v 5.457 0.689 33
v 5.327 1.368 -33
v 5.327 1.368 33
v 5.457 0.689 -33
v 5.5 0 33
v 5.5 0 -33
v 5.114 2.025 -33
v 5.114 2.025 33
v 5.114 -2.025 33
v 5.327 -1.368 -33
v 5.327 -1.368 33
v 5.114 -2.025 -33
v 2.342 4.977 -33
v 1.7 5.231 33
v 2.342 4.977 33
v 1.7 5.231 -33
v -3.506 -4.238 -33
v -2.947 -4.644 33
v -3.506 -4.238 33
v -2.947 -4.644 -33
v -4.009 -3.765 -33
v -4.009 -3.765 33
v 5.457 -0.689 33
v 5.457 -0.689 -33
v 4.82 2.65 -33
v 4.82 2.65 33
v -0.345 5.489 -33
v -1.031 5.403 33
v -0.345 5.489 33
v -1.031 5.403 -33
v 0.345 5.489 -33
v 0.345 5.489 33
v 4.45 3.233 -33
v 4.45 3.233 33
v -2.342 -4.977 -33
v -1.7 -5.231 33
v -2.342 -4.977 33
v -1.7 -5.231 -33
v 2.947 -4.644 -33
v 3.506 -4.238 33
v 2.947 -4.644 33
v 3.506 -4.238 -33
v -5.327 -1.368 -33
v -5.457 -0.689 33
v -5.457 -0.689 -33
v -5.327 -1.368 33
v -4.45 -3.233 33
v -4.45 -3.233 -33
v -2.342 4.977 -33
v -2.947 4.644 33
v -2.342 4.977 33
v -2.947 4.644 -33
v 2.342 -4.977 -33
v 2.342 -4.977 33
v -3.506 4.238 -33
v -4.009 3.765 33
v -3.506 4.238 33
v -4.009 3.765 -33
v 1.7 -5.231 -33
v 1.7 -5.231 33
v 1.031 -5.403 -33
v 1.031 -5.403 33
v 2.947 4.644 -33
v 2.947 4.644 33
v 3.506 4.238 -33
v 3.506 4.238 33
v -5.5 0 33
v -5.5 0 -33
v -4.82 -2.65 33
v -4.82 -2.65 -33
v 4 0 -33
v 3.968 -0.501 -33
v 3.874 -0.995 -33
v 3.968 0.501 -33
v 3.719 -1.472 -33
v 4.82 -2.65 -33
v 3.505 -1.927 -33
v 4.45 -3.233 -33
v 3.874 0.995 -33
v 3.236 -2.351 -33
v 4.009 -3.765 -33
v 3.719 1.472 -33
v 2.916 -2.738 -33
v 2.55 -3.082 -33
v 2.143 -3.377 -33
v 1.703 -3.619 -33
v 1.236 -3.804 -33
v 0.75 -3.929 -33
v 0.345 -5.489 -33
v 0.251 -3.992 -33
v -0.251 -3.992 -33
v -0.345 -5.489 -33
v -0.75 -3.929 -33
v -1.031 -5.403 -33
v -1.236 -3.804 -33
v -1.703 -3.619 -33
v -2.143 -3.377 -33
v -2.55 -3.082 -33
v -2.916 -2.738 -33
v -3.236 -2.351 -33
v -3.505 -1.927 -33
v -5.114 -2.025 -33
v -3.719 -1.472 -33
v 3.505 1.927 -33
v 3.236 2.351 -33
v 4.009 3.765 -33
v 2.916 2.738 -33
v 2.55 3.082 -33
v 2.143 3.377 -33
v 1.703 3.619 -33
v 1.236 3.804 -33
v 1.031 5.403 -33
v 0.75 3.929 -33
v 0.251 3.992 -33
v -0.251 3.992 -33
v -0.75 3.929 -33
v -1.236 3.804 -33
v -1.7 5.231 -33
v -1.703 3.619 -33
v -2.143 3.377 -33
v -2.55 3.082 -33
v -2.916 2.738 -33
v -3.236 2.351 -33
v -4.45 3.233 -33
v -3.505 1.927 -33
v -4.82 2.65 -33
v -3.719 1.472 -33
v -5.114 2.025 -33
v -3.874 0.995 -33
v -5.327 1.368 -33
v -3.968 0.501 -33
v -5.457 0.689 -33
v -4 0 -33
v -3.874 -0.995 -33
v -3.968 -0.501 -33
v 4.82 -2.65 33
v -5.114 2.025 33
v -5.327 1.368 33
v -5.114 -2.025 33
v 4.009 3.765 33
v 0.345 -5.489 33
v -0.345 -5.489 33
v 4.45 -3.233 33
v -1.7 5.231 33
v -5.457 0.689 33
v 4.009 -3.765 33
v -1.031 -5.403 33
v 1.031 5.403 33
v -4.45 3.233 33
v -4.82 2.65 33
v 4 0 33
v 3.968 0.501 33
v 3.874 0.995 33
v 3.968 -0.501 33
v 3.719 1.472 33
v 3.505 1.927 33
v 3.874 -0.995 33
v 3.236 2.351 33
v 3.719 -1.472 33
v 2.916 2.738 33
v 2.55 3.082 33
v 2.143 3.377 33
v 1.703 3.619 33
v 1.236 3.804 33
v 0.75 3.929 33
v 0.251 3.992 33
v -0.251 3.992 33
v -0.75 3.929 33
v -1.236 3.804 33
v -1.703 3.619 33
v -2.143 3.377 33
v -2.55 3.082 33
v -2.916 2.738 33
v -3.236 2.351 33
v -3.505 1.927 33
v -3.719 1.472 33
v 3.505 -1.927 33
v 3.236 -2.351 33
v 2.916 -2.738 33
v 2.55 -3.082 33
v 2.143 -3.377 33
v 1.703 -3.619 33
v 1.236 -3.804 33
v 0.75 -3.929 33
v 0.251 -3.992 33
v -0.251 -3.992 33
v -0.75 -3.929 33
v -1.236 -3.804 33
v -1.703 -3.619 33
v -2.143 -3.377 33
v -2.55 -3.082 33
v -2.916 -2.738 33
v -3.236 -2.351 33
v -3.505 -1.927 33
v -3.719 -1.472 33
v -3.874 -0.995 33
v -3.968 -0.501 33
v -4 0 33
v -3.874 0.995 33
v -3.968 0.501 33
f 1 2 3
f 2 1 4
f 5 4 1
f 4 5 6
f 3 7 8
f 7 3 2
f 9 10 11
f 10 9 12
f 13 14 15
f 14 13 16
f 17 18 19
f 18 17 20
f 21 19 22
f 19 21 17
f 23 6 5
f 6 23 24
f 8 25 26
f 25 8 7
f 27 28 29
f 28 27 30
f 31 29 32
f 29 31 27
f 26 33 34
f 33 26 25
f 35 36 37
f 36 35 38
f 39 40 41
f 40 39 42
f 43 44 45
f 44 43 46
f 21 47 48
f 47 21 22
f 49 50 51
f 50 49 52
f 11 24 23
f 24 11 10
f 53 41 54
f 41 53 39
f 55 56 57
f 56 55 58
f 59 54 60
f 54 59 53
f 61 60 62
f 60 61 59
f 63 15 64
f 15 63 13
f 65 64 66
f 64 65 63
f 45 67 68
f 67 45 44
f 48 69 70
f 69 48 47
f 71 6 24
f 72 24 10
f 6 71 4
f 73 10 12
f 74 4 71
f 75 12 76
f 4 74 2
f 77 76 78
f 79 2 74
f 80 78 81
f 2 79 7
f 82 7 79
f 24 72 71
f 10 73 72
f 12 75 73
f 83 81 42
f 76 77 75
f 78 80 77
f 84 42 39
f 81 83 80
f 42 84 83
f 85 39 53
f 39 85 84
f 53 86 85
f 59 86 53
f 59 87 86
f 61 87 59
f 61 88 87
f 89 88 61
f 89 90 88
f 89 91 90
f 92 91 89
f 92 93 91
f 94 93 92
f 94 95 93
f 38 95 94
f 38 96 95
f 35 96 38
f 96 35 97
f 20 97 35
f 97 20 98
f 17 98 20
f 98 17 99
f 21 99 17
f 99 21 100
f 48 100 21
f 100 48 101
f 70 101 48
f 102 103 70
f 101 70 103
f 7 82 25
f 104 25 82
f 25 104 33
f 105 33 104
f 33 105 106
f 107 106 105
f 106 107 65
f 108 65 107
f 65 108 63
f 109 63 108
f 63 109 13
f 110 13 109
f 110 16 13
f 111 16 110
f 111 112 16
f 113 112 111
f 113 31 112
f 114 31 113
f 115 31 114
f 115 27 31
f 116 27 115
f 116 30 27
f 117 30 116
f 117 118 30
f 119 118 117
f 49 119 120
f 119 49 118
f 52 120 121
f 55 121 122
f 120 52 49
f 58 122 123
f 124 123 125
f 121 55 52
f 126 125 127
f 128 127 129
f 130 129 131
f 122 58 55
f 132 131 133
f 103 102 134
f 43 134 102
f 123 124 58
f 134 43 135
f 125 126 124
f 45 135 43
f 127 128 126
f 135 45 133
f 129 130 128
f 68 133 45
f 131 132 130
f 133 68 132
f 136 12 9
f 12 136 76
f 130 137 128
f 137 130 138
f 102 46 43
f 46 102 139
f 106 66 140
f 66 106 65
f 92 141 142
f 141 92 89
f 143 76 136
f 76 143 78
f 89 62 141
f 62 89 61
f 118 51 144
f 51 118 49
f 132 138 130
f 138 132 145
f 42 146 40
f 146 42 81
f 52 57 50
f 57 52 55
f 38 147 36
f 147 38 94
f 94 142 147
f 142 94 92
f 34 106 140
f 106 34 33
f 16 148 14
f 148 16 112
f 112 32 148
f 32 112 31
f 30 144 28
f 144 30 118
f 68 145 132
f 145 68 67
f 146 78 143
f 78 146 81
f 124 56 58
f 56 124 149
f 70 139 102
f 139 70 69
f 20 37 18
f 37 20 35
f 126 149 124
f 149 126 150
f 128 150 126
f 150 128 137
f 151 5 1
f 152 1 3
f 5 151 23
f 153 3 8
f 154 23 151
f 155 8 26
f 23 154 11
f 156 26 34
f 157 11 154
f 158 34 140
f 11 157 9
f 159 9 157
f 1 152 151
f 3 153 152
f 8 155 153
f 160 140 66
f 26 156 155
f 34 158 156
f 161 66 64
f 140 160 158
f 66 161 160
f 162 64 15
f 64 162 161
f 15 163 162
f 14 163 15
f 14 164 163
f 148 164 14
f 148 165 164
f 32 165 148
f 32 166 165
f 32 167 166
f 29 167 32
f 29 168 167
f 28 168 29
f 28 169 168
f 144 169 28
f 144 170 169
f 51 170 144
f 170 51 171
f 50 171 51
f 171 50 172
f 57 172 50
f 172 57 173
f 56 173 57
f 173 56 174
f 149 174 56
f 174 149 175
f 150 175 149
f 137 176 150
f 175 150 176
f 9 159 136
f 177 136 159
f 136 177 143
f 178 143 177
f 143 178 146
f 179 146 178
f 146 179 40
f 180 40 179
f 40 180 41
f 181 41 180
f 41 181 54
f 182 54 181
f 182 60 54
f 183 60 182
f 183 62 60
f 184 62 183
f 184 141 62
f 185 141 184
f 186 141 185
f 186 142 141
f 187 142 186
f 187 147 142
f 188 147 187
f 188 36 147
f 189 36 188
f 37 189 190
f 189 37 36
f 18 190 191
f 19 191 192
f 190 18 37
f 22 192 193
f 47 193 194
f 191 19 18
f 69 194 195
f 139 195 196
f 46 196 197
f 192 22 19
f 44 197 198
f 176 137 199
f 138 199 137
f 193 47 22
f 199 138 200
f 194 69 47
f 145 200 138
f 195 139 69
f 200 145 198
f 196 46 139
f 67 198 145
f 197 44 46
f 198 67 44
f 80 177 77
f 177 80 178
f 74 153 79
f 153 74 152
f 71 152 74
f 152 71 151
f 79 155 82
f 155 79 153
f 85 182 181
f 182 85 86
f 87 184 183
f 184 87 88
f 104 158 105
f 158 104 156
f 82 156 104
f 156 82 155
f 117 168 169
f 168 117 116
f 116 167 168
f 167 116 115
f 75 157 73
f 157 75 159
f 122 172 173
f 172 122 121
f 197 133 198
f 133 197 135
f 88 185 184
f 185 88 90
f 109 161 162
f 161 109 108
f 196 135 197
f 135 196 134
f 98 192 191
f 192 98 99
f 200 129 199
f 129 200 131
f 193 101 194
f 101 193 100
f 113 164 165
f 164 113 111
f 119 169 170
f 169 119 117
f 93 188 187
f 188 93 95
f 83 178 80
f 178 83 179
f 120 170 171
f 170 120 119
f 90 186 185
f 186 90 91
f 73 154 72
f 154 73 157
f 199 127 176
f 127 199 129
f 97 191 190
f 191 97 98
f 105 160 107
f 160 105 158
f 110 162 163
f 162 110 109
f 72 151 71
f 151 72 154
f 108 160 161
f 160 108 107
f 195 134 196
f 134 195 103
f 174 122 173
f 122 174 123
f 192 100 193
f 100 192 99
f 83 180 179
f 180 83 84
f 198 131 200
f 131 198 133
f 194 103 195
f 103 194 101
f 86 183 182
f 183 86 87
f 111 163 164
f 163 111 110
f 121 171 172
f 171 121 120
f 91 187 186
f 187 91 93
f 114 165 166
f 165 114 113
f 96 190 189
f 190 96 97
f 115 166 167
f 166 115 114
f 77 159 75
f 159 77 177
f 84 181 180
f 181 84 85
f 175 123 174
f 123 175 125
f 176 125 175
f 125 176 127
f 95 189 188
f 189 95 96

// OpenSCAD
$fn = 50;


difference() {
	union() {
		translate(v = [0, 0, -33.0000000000]) {
			cylinder(h = 66, r = 5.5000000000);
		}
	}
	union() {
		translate(v = [0, 0, -100.0000000000]) {
			cylinder(h = 200, r = 4.0000000000);
		}
	}
}
